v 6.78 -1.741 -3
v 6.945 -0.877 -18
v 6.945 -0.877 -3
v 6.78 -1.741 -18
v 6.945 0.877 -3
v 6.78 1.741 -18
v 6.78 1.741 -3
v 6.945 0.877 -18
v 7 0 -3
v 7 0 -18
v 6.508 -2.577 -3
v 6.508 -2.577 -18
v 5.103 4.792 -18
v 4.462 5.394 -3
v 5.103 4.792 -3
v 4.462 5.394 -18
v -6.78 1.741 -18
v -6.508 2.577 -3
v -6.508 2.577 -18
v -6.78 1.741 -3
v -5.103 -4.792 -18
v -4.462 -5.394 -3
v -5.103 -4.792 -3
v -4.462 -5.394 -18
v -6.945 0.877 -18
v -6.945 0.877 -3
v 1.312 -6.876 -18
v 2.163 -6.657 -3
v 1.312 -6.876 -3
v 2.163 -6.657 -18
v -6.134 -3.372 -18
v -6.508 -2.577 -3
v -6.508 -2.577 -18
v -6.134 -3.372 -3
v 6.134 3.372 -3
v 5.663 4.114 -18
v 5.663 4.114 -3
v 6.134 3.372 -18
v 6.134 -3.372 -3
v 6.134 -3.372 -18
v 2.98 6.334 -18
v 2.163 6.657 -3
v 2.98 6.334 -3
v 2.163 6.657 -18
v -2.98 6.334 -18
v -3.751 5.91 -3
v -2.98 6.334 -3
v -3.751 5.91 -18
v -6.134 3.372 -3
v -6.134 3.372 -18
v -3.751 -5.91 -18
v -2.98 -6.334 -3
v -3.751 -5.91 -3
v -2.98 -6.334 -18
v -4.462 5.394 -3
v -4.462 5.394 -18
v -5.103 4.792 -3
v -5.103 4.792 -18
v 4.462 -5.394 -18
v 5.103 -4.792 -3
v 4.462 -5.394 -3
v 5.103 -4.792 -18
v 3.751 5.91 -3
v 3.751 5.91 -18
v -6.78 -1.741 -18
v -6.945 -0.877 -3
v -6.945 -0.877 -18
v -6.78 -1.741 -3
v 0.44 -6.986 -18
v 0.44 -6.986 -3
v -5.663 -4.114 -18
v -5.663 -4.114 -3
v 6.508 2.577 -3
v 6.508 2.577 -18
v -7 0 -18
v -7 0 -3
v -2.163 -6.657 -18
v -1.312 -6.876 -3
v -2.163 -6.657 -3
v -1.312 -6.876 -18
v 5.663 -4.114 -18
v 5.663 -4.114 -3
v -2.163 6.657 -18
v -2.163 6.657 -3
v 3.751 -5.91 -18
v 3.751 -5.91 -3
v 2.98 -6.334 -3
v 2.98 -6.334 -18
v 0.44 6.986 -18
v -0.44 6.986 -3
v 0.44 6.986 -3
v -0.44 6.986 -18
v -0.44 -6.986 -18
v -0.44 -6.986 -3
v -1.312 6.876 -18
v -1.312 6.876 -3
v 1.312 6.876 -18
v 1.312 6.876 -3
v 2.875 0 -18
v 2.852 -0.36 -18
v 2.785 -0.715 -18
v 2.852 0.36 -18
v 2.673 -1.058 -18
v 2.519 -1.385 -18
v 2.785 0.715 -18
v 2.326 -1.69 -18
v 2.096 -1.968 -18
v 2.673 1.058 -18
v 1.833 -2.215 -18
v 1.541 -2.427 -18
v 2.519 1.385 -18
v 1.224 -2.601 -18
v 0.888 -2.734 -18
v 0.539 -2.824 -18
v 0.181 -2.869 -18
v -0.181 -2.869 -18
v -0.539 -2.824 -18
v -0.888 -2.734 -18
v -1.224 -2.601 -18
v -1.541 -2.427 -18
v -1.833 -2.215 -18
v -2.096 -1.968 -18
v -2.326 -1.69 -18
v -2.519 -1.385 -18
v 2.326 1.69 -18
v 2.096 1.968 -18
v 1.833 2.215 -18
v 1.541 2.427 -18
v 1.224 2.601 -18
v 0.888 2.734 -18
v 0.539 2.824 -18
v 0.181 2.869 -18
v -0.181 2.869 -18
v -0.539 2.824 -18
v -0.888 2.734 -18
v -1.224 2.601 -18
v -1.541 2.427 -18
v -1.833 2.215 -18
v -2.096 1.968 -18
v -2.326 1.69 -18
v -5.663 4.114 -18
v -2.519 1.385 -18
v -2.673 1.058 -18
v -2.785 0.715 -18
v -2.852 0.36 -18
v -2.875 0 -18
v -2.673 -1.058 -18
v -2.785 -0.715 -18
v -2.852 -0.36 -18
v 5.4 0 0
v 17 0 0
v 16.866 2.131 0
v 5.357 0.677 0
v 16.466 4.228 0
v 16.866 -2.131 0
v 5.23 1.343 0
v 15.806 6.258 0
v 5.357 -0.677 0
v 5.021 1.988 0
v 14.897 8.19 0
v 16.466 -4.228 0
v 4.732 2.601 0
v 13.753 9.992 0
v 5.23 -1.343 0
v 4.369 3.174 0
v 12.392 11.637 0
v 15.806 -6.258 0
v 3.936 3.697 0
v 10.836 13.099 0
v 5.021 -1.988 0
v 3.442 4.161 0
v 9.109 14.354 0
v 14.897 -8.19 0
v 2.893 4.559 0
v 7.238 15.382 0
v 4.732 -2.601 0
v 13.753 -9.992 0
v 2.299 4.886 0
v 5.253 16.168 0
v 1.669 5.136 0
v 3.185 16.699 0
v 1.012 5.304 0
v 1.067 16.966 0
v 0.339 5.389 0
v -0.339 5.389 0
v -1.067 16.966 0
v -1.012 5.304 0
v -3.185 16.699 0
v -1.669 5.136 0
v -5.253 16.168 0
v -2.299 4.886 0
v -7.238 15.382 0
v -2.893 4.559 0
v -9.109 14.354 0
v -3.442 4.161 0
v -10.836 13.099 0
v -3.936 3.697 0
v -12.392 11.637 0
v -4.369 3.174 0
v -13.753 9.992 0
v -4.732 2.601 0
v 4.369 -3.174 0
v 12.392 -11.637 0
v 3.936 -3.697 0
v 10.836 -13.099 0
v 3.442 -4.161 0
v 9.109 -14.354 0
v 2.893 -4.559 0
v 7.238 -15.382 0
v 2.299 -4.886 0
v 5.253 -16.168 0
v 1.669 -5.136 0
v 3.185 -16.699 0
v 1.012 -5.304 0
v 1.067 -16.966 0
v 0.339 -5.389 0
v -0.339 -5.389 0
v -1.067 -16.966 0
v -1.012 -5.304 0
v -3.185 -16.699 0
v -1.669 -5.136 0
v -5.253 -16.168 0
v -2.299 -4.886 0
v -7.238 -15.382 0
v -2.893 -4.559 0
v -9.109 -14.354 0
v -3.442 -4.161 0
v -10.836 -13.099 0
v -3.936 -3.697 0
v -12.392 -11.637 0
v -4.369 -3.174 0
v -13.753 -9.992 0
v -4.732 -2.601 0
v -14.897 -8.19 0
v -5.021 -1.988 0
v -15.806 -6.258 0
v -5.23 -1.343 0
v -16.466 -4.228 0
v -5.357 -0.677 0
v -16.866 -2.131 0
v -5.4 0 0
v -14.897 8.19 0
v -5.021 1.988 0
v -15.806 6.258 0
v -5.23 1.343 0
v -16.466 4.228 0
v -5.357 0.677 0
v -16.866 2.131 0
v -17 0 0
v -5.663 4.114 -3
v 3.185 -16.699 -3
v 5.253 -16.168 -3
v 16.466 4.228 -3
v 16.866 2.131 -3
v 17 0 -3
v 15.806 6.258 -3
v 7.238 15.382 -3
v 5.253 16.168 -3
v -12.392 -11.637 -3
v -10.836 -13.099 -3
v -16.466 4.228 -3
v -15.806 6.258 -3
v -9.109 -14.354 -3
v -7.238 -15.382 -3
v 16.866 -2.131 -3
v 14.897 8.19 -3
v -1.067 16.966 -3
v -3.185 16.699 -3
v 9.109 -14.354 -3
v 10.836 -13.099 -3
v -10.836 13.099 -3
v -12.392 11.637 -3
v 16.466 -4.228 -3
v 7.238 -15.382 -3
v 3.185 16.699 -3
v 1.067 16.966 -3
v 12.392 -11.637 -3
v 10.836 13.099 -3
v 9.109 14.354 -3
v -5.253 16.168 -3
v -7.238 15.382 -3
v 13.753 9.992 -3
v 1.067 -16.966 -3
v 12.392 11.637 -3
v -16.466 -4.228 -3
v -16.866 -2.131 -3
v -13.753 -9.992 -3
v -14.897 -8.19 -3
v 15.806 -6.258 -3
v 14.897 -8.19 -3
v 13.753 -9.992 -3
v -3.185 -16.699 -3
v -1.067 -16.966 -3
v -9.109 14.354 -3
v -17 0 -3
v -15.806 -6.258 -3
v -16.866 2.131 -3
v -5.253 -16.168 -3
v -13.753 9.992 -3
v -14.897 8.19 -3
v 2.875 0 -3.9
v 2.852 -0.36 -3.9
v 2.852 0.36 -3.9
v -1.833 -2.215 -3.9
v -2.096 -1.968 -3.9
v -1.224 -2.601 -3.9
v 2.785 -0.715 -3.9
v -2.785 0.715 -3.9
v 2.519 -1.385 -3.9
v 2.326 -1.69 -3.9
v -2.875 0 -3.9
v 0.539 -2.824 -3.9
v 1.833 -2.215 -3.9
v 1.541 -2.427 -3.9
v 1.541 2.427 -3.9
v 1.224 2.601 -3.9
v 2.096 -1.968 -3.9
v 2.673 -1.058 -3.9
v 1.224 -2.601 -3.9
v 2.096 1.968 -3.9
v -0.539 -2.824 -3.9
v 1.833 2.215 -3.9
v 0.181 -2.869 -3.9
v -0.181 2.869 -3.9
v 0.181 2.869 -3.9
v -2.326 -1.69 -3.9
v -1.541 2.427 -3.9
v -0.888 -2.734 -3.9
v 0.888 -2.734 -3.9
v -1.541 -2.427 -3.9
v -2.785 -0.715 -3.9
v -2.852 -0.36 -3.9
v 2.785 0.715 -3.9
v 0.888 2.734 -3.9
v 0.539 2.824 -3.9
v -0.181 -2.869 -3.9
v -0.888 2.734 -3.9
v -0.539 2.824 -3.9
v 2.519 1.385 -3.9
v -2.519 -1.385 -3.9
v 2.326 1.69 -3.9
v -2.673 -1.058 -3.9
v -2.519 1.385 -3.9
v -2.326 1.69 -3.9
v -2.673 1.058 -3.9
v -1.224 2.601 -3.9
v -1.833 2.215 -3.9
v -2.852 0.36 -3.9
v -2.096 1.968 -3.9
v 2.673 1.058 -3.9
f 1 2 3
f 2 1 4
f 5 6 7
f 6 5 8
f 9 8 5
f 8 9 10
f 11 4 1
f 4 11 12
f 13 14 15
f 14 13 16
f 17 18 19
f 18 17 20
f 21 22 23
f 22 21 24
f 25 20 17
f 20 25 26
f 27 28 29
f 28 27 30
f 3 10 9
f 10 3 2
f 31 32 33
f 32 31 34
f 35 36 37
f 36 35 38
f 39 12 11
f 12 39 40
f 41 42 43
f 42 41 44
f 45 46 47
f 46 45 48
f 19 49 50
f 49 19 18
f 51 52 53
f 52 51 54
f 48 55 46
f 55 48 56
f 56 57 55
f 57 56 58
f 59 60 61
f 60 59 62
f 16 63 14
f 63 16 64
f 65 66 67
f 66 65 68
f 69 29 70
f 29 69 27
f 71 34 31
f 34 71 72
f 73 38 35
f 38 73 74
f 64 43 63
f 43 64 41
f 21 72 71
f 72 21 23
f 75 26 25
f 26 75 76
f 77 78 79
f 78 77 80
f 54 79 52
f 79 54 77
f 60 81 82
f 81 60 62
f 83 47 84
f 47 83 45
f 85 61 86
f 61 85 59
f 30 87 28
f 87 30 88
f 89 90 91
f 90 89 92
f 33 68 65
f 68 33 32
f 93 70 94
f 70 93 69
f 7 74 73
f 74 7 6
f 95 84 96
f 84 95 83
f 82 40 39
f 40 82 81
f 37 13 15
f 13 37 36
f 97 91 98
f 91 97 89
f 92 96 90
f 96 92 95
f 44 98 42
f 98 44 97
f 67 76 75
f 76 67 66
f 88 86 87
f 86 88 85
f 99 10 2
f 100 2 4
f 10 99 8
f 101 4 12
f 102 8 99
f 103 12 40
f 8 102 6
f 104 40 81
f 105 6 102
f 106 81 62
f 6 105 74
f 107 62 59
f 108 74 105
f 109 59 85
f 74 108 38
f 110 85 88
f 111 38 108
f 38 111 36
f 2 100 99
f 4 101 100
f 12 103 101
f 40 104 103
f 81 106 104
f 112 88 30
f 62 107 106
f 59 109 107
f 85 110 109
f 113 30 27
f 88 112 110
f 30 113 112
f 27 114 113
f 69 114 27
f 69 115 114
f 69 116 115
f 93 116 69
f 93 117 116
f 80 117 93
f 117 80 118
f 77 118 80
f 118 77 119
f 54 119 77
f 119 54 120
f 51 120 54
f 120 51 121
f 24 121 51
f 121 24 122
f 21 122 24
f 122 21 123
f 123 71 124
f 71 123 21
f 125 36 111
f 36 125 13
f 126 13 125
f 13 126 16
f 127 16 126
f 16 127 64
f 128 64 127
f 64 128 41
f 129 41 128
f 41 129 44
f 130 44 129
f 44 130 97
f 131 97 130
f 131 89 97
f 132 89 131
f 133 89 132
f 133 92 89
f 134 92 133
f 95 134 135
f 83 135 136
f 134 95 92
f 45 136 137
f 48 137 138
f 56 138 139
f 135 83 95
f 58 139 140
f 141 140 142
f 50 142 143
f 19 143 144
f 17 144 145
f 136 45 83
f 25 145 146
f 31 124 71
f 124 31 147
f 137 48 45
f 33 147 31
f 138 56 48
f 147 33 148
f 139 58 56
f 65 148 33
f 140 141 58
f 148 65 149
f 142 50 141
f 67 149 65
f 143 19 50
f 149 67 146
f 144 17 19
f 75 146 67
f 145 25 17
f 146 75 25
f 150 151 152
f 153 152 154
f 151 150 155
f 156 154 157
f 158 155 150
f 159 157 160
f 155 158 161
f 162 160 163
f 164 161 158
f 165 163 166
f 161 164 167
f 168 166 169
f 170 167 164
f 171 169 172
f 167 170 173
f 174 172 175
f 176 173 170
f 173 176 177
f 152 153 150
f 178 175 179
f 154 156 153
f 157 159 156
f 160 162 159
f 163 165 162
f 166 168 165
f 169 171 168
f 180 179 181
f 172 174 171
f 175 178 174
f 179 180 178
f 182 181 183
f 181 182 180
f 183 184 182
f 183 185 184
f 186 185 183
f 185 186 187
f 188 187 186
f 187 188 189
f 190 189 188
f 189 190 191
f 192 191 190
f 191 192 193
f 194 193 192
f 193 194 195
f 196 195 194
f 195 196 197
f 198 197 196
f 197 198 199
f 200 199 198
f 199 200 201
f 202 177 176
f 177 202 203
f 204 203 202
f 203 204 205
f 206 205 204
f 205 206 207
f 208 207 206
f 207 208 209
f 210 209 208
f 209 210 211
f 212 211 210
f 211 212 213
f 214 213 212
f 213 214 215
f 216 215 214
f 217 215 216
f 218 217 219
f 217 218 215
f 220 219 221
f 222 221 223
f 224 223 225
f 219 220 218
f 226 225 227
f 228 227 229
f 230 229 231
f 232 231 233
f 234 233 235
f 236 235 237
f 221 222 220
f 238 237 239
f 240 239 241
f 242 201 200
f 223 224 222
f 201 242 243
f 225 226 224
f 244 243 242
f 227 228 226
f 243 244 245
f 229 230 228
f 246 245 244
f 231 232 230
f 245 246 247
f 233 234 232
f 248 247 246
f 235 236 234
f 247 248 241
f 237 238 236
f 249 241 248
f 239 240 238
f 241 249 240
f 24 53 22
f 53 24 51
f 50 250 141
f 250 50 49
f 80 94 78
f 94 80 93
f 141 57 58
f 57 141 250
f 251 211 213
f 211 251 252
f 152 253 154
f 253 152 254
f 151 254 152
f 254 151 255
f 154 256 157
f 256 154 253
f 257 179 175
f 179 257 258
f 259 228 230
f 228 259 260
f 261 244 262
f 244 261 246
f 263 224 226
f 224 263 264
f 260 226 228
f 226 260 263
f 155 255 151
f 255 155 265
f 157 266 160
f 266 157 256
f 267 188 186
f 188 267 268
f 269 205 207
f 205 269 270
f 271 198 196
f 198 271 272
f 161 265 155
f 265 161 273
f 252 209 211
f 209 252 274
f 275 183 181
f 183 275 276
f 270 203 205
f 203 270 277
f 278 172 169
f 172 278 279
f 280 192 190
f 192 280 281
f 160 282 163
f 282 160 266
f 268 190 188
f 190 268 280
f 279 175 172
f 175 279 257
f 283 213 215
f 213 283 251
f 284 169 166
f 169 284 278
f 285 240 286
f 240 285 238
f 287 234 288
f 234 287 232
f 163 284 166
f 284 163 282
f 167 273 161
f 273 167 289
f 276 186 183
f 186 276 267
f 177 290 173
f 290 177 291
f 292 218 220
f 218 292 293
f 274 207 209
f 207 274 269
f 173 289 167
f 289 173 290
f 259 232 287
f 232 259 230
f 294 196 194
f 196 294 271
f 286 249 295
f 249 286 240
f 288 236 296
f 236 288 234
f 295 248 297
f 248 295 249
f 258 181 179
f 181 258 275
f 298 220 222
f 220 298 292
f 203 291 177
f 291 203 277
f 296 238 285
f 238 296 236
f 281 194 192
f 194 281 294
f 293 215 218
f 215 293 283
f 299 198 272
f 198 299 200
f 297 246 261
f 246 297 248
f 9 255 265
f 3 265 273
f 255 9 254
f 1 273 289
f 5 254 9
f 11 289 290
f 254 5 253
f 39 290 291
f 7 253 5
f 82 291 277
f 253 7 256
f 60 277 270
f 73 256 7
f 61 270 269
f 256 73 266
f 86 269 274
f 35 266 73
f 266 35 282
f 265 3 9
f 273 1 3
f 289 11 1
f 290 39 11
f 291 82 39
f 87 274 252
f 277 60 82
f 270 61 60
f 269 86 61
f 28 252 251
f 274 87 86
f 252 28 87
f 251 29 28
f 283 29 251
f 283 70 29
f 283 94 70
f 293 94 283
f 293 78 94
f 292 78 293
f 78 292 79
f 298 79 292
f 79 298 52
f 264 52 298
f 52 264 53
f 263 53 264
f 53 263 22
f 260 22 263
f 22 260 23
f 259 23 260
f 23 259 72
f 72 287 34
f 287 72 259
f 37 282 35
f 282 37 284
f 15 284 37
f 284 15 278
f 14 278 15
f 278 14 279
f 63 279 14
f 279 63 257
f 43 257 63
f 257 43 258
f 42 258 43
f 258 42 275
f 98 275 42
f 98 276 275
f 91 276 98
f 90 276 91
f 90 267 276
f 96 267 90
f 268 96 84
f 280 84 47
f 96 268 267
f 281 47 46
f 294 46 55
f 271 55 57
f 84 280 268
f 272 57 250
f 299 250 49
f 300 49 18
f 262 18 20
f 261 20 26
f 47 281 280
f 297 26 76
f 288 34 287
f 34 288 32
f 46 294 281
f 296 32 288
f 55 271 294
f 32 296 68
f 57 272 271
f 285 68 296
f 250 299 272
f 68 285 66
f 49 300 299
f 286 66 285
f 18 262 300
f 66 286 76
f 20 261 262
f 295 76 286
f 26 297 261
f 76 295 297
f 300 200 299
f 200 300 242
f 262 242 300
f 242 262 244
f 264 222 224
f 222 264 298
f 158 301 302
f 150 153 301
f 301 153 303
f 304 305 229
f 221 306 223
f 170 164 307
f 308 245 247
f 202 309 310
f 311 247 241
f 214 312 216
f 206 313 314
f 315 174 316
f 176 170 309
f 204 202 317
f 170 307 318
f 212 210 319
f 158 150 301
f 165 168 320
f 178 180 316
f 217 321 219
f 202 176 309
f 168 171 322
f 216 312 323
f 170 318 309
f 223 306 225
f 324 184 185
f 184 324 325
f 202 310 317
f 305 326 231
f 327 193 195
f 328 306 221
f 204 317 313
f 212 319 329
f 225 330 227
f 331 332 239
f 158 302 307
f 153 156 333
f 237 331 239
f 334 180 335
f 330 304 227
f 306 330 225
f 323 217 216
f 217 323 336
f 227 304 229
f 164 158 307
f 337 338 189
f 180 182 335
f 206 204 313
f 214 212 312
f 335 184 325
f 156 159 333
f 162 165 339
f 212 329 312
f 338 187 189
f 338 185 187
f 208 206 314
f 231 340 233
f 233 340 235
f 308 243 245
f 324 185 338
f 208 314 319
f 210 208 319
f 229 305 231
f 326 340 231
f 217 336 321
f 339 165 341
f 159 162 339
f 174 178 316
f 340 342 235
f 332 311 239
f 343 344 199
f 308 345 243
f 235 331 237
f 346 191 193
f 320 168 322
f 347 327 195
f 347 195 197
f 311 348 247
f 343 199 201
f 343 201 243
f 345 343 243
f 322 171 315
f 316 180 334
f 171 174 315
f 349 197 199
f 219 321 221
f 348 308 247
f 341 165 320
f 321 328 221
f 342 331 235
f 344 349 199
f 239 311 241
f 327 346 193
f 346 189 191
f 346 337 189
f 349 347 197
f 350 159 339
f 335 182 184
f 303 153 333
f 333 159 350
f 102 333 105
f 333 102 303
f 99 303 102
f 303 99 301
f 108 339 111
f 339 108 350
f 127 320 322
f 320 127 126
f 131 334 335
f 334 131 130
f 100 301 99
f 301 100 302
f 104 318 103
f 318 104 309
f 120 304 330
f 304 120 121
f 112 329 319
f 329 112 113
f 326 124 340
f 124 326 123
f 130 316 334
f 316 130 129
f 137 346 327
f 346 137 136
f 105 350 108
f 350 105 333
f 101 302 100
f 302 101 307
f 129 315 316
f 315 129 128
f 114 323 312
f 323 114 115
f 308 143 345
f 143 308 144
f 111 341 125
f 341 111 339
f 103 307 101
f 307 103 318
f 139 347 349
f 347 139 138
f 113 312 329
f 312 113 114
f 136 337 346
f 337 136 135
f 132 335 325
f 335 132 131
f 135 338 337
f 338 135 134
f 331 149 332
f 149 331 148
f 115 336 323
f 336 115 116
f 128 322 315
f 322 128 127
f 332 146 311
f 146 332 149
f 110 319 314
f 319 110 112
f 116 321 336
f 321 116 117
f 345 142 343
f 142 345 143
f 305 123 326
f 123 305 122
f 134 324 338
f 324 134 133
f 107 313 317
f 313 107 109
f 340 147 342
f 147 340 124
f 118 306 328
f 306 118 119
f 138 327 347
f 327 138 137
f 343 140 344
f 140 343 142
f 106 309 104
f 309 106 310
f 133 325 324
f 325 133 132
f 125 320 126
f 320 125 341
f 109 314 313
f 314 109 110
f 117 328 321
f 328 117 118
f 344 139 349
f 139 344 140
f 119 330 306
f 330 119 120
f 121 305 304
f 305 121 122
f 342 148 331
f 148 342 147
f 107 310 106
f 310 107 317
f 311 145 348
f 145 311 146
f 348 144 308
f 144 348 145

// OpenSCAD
$fn = 50;


difference() {
	union() {
		translate(v = [0, 0, -18.0000000000]) {
			cylinder(h = 18, r = 7.0000000000);
		}
		translate(v = [0, 0, -3.0000000000]) {
			cylinder(h = 3, r = 17.0000000000);
		}
	}
	union() {
		translate(v = [0, 0, 0]) {
			rotate(a = [0, 0, 0]) {
				difference() {
					union() {
						#translate(v = [0, 0, -18.0000000000]) {
							cylinder(h = 18, r = 2.6000000000);
						}
						#translate(v = [0, 0, -3.9000000000]) {
							cylinder(h = 3.9000000000, r = 7.0000000000, r1 = 2.8750000000, r2 = 5.4000000000);
						}
						#translate(v = [0, 0, -18.0000000000]) {
							cylinder(h = 18, r = 2.8750000000);
						}
						#translate(v = [0, 0, -18.0000000000]) {
							cylinder(h = 18, r = 2.6000000000);
						}
					}
					union();
				}
			}
		}
	}
}
